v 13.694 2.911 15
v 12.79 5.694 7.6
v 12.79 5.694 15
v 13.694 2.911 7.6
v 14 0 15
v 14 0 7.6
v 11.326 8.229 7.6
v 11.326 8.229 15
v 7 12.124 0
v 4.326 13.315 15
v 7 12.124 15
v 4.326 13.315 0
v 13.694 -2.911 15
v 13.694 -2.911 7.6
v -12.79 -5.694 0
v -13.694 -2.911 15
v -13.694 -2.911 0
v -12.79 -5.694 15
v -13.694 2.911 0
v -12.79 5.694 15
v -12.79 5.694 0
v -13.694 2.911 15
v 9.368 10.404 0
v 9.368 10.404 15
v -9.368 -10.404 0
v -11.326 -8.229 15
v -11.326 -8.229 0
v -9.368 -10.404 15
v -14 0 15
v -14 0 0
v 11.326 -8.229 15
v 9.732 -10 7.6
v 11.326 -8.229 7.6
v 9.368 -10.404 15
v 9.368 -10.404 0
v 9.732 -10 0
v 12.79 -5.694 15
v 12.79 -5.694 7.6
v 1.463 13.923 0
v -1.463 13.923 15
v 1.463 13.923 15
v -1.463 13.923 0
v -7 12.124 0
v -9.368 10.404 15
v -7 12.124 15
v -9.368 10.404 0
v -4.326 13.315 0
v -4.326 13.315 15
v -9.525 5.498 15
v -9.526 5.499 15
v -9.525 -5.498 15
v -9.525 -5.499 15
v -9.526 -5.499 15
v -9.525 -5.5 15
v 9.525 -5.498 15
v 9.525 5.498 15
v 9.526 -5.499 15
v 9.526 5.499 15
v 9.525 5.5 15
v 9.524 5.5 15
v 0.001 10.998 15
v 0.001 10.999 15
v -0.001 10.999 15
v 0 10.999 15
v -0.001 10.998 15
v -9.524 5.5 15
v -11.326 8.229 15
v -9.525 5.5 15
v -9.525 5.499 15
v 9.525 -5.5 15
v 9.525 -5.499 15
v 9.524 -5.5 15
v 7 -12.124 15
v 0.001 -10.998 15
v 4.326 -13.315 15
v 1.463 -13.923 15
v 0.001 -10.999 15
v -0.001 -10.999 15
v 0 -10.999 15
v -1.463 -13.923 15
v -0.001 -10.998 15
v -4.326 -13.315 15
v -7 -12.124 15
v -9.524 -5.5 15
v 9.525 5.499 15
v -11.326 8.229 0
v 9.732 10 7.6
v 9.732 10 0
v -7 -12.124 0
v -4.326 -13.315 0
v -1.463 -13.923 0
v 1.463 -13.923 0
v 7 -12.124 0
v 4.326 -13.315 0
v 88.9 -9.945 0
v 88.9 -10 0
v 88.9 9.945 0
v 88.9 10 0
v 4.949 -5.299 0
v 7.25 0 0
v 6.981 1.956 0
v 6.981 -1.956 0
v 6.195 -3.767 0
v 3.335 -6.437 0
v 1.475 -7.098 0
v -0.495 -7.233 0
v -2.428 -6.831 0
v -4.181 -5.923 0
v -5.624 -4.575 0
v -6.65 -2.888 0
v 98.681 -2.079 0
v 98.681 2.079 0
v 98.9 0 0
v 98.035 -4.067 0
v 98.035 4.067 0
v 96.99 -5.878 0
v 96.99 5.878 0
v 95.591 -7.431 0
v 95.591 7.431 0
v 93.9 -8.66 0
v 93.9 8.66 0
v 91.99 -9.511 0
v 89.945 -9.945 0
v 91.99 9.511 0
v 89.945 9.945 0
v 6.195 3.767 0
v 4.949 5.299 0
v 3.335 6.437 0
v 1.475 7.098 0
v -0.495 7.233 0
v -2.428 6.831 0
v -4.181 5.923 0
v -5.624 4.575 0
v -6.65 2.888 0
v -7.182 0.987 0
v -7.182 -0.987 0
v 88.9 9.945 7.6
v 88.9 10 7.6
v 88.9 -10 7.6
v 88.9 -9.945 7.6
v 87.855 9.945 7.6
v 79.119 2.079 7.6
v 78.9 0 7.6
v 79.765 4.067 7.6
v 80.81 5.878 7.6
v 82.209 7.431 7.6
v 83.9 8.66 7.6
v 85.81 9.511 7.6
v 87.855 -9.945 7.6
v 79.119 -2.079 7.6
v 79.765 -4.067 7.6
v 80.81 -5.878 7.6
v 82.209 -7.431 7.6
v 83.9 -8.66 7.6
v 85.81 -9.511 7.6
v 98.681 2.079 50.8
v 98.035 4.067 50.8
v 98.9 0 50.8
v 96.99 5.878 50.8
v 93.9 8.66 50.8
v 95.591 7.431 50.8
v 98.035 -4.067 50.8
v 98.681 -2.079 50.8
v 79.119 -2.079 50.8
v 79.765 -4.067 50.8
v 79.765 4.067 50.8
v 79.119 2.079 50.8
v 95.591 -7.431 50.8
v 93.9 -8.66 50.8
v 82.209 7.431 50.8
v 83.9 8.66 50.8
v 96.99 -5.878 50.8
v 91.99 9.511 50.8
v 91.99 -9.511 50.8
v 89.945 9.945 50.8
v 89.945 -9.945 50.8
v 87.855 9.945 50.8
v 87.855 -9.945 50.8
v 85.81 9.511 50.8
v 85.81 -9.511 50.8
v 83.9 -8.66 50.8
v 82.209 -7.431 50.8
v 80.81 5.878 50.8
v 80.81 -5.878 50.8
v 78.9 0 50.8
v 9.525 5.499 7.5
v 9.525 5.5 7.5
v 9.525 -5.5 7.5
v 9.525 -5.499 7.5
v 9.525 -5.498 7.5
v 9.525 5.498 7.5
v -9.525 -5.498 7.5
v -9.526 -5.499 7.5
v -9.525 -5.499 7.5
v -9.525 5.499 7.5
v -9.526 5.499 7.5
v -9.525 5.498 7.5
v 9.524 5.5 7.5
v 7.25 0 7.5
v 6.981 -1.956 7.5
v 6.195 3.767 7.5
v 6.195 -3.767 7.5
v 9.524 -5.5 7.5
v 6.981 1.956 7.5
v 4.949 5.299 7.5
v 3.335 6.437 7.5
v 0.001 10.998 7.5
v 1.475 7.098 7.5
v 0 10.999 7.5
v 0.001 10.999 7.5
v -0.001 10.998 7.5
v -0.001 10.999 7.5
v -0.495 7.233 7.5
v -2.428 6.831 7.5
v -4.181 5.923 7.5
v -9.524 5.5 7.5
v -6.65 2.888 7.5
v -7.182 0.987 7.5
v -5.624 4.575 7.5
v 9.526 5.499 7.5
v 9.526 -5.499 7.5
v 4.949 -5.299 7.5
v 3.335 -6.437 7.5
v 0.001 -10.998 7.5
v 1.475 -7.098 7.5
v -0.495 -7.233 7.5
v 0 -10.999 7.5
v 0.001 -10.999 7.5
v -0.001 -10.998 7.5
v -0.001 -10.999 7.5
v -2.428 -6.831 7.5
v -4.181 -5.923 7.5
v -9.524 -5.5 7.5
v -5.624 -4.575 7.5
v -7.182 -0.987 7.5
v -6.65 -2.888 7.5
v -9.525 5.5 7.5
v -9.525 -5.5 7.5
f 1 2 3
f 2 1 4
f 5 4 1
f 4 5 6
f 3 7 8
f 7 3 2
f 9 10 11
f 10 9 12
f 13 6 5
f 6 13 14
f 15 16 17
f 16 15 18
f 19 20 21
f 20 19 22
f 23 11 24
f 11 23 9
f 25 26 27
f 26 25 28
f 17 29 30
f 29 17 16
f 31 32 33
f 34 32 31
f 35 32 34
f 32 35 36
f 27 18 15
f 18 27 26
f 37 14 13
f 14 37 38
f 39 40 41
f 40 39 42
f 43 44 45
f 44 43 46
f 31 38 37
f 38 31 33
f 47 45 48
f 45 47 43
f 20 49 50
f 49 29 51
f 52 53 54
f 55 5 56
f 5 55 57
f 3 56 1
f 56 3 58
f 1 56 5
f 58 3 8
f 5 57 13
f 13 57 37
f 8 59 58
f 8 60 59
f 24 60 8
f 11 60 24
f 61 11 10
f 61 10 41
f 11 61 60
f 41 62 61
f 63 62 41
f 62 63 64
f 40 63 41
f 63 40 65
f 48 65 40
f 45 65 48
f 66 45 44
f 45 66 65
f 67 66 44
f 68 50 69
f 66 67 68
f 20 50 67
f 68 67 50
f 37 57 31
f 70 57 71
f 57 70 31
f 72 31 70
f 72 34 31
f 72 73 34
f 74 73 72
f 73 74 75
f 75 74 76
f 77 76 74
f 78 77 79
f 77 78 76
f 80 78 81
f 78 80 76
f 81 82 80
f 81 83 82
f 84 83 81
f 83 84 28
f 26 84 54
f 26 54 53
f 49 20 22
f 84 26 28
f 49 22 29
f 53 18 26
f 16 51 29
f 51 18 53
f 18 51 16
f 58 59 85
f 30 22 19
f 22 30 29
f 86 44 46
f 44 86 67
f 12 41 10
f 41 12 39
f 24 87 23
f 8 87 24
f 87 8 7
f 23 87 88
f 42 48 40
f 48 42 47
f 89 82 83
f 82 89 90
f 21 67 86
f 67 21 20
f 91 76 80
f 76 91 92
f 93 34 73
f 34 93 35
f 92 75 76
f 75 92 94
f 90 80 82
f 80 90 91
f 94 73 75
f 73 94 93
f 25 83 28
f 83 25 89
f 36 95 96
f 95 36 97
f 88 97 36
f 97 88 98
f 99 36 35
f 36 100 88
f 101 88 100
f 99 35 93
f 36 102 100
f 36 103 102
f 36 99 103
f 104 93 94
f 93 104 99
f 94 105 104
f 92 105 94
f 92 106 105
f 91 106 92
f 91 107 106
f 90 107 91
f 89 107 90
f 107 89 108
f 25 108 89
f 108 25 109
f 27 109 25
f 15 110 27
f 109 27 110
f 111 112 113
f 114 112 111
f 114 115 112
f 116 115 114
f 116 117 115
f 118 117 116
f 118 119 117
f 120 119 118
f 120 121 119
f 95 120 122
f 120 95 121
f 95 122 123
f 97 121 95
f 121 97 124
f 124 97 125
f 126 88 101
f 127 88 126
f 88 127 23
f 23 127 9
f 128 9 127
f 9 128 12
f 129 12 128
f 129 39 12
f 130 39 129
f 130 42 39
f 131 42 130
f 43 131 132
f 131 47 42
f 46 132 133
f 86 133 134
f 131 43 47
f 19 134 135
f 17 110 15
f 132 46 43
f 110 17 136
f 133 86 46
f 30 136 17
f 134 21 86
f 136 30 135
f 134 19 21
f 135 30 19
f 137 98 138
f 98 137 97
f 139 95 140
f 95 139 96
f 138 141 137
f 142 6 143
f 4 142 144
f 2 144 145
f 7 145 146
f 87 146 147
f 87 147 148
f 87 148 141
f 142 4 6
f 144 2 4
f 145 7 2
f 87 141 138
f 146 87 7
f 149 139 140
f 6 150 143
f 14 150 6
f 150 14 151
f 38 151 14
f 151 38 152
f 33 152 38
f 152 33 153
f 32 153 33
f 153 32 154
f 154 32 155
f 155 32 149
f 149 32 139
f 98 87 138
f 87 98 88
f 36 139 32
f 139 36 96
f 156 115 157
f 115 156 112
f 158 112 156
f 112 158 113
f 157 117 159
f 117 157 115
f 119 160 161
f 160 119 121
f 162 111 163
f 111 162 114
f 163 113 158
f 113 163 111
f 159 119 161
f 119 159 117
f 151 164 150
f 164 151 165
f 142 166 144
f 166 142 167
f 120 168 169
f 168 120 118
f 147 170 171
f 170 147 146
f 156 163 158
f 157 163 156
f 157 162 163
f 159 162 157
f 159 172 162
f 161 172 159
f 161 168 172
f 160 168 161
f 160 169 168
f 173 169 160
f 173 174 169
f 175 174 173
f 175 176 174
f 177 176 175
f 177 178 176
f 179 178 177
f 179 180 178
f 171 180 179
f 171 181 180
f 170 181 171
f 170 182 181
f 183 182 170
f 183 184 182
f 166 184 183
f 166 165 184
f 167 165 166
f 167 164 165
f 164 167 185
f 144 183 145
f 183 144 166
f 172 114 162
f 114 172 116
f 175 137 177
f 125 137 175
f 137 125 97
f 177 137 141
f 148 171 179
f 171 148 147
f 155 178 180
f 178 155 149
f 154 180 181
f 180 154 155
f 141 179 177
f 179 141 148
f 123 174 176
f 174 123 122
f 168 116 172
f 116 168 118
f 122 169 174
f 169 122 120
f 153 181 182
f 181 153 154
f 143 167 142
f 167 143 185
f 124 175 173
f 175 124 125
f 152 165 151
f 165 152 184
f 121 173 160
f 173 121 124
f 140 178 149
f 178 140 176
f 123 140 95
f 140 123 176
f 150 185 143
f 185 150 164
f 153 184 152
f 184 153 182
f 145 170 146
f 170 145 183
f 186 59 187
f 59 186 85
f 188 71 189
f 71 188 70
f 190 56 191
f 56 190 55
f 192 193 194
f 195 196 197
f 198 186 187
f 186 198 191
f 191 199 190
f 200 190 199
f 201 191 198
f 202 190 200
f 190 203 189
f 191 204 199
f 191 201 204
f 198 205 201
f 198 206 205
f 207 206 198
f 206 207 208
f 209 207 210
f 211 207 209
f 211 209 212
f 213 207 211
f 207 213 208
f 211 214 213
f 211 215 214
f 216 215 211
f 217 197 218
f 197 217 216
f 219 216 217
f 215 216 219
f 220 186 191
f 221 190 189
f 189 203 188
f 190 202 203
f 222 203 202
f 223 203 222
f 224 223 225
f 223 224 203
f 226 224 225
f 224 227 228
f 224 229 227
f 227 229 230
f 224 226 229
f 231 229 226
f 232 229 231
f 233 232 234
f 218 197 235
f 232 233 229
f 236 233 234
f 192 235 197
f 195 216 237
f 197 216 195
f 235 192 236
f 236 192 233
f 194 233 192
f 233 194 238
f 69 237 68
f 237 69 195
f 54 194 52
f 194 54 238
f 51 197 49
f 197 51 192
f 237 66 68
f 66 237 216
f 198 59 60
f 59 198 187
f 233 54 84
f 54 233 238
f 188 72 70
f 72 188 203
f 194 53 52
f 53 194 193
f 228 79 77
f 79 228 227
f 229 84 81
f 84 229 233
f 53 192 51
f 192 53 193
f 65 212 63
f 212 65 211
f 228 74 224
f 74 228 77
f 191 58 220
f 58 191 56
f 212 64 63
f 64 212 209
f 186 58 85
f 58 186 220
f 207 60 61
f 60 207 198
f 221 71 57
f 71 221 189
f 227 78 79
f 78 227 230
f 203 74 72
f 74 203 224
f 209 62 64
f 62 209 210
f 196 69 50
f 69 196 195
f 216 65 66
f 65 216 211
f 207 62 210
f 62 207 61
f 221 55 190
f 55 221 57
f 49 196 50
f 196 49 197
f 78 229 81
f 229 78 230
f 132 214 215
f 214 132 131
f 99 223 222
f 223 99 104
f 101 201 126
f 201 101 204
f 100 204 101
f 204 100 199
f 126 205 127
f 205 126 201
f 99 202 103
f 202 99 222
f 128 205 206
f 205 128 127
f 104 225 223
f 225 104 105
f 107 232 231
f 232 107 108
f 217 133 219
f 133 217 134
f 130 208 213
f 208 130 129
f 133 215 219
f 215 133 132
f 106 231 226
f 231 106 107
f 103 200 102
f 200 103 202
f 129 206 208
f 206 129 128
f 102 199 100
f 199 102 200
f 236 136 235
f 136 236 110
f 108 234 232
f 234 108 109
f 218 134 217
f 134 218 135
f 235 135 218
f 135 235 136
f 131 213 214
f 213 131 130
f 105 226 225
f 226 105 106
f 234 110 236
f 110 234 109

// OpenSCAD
wtotal = 1.5 * 25.4 * 0.5;
wface = 11.;
h = 7.6;
whandle = 20;
lhandle = 3.5 * 25.4;
dhandle = 20;
hhandle = 2. * 25.4;
module nut()
{
    rotate([ 0, 0, 0 ]) translate([ 0, 0, 0 ]) cube([ wtotal, wface, h ], center = true);

    rotate([ 0, 0, 60 ]) cube([ wtotal, wface, h ], center = true);

    rotate([ 0, 0, -60 ]) cube([ wtotal, wface, h ], center = true);
}

module handle()
{
    cylinder(15, d = 28);
    translate([ 0, -whandle / 2, 0 ]) cube([ lhandle, whandle, h ]);
    translate([ lhandle, 0, 0 ]) cylinder(hhandle, d = dhandle);
}

difference()
{
    handle();
    translate([ 0, 0, 0.1 + 15 - h + h / 2 ]) nut();
    cylinder(50, d = 14.5, center = true);
}
